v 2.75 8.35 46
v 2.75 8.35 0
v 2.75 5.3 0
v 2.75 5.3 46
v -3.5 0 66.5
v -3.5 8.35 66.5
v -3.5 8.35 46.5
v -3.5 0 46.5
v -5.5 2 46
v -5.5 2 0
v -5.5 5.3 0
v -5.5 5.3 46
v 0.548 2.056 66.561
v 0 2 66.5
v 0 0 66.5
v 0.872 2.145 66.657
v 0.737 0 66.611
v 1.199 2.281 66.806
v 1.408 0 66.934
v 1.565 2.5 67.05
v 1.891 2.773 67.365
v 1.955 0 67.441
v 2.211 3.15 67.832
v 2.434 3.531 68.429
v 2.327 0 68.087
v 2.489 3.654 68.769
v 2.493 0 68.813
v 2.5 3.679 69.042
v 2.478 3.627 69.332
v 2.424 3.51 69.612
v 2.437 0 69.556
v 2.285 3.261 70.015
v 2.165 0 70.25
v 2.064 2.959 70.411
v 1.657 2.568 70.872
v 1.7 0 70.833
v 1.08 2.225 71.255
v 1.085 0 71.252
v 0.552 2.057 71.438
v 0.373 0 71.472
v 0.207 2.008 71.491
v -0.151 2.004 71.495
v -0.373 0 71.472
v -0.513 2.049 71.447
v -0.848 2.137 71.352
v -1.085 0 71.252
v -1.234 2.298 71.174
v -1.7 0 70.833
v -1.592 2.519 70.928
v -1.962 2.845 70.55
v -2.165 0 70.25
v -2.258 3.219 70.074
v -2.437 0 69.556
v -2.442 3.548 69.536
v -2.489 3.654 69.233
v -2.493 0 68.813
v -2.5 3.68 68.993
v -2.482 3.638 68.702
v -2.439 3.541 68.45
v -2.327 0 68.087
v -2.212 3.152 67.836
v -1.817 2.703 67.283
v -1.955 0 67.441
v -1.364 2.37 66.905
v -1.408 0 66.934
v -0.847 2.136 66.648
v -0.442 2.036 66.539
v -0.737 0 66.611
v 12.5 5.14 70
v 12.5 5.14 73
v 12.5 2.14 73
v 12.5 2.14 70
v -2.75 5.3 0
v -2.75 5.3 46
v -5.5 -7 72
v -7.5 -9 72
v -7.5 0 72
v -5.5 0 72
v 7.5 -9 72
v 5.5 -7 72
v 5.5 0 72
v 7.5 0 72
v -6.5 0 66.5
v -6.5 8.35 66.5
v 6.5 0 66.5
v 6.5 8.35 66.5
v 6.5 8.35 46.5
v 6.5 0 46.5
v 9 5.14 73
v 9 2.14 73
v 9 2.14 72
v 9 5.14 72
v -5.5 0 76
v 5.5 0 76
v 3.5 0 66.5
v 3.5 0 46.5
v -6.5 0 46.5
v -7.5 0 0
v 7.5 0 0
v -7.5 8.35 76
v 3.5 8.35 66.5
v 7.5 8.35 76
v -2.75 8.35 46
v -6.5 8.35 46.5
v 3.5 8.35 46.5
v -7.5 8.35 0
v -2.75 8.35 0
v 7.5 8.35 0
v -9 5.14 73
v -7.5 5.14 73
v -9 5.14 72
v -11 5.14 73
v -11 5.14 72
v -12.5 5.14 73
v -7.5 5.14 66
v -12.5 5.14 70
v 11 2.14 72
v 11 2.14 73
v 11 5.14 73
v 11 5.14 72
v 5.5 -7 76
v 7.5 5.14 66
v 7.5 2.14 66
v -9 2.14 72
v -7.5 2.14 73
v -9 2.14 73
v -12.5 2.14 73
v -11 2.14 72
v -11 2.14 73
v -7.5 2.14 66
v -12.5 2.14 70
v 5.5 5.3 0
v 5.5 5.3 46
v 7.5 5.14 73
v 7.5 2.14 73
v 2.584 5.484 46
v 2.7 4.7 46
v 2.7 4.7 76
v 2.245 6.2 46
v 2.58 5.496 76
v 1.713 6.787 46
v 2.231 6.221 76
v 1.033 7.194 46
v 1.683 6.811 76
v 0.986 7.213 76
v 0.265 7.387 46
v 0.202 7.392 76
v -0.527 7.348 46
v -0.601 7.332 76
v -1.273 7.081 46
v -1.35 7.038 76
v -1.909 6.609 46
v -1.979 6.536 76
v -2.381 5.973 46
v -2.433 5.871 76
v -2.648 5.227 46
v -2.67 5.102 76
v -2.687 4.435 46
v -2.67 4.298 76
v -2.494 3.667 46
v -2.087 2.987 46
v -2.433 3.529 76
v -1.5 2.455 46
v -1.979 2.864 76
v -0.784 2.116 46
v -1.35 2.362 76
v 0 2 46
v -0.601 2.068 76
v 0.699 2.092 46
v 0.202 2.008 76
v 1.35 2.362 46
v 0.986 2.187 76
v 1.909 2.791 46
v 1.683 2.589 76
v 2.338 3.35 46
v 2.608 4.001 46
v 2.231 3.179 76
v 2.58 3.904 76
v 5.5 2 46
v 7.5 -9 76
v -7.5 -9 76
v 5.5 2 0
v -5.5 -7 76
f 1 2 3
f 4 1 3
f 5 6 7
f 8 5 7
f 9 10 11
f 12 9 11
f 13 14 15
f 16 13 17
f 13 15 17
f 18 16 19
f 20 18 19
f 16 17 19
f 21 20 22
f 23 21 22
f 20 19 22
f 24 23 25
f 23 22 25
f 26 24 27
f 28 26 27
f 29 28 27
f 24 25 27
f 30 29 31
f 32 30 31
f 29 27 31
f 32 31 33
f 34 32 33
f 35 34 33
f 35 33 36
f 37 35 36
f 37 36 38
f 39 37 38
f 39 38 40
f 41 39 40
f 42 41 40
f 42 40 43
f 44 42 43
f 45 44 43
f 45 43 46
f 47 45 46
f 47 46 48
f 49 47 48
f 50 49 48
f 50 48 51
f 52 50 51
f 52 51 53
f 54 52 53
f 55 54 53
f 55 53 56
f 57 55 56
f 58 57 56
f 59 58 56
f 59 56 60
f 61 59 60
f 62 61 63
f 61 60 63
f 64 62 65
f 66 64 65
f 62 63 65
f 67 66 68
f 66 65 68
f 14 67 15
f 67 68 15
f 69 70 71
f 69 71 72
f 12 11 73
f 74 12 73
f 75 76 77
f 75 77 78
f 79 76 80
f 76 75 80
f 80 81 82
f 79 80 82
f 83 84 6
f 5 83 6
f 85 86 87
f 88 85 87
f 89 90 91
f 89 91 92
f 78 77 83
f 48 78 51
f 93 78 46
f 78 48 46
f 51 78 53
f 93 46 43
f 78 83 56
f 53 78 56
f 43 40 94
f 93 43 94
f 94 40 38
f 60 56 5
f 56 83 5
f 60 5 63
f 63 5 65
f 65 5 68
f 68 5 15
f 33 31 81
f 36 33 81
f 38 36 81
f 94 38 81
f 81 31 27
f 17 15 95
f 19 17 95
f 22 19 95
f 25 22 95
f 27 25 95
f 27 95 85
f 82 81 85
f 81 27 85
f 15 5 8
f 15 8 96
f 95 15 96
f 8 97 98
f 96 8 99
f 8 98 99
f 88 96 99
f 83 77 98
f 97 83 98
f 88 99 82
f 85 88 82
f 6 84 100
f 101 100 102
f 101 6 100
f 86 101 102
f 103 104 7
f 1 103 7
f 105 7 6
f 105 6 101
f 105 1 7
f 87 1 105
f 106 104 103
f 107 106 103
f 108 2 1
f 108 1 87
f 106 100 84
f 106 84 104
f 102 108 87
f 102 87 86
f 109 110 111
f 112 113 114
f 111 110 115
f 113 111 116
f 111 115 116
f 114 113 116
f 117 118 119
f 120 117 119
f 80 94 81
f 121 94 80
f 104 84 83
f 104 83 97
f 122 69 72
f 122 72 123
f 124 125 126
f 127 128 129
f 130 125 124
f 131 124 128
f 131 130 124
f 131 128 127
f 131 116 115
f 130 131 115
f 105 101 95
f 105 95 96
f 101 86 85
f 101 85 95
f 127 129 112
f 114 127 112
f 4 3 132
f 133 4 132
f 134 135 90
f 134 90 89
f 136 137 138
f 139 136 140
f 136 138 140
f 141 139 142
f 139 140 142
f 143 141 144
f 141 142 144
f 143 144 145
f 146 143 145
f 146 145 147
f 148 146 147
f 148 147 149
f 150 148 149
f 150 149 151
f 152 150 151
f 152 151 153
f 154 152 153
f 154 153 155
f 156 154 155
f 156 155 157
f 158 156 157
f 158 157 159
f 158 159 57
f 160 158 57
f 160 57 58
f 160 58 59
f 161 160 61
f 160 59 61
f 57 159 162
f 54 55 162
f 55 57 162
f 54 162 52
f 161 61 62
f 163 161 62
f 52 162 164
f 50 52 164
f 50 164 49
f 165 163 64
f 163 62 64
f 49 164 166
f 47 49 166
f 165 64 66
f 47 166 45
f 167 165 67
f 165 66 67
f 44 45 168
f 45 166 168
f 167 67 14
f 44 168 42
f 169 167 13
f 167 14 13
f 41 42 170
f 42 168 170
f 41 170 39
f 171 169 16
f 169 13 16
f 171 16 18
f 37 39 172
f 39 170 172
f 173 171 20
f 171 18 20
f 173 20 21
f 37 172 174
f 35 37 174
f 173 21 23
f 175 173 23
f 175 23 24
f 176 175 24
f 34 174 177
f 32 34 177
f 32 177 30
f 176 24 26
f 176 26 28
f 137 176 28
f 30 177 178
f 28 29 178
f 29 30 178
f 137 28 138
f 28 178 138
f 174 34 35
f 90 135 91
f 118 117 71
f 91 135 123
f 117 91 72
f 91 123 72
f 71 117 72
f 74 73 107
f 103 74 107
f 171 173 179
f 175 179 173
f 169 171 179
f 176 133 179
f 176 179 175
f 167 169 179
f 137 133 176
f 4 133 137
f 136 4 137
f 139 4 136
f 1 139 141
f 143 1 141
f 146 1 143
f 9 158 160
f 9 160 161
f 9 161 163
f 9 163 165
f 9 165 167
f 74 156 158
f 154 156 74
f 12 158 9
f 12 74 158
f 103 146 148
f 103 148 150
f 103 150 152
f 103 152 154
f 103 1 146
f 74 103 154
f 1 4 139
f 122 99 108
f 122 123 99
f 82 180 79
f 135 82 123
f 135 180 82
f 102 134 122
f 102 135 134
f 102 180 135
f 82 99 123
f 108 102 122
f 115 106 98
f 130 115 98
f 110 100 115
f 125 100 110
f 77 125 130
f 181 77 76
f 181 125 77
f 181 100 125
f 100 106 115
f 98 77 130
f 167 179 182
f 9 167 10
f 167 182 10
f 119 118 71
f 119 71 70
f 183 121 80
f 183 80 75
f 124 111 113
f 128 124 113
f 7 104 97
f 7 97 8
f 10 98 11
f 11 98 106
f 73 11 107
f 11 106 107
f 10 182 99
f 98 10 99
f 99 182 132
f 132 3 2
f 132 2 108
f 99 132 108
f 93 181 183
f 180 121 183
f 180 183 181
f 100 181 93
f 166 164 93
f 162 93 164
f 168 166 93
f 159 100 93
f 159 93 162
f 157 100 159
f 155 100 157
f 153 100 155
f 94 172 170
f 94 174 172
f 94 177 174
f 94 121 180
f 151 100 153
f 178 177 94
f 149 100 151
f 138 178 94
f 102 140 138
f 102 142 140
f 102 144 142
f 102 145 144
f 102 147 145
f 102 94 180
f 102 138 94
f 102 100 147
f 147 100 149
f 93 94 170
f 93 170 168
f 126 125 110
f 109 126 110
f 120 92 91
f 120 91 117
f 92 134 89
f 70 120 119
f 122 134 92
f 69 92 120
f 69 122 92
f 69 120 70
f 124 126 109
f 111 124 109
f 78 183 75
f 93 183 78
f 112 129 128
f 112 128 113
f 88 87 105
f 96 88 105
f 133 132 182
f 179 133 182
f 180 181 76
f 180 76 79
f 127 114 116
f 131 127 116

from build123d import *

# Parameters (mm, degrees)
SKETCH9_W               = 15
SKETCH9_H               = 8.35
BOSS_EXTRUDE4_DEPTH     = 76
CUT_EXTRUDE4_DEPTH      = 46
SKETCH10_R              = 2.7
CUT_EXTRUDE5_DEPTH      = 30
SKETCH12_W              = 3
SKETCH12_H              = 3
BOSS_EXTRUDE5_DEPTH     = 5
SKETCH13_W              = 2
SKETCH13_H              = 3
CUT_EXTRUDE6_DEPTH      = 1
BOSS_EXTRUDE6_DEPTH     = 3
CUT_EXTRUDE7_REACH      = 79.472
SKETCH15_W              = 3
SKETCH15_H              = 20
CUT_EXTRUDE8_REACH      = 79.472
CUT_EXTRUDE8_END_RADIUS = 2.7
SKETCH16_R              = 2.5
BOSS_EXTRUDE8_DEPTH     = 4


with BuildPart() as part:
    # Sketch9 → Boss-Extrude4 (new body)
    with BuildSketch(Plane.XY):
        with Locations((0, 4.175)):
            Rectangle(SKETCH9_W, SKETCH9_H)
    extrude(amount=BOSS_EXTRUDE4_DEPTH)

    # Sketch7 → Cut-Extrude4 (cut)
    with BuildSketch(Plane.XY):
        Polygon((-5.5, 2), (-5.5, 5.3), (-2.75, 5.3), (-2.75, 8.35), (2.75, 8.35), (2.75, 5.3), (5.5, 5.3), (5.5, 2), align=None)
    extrude(amount=CUT_EXTRUDE4_DEPTH, mode=Mode.SUBTRACT)

    # Sketch10 → Cut-Extrude5 (cut)
    with BuildSketch(Plane.XY.offset(76)):
        with Locations((0, 4.7)):
            Circle(SKETCH10_R)
    extrude(amount=-CUT_EXTRUDE5_DEPTH, mode=Mode.SUBTRACT)

    # Sketch12 → Boss-Extrude5 (add)
    with BuildSketch(Plane(origin=(7.5, 0, 0), x_dir=(0, 0, -1), z_dir=(1, 0, 0))):
        with Locations((-71.5, 3.64)):
            Rectangle(SKETCH12_W, SKETCH12_H)
    boss_extrude5 = extrude(amount=BOSS_EXTRUDE5_DEPTH)

    # Sketch13 → Cut-Extrude6 (cut)
    with BuildSketch(Plane.XY.offset(73)):
        with Locations((10, 3.64)):
            Rectangle(SKETCH13_W, SKETCH13_H)
    cut_extrude6 = extrude(amount=-CUT_EXTRUDE6_DEPTH, mode=Mode.SUBTRACT)

    # Mirror2: Boss-Extrude5 across plane
    add(boss_extrude5.mirror(Plane(origin=(0, 0, 0), x_dir=(0, 0, 1), z_dir=(1, 0, 0))))

    # Mirror4: Cut-Extrude6 across plane
    add(cut_extrude6.mirror(Plane(origin=(0, 0, 0), x_dir=(0, 0, 1), z_dir=(1, 0, 0))), mode=Mode.SUBTRACT)

    # Sketch14 → Boss-Extrude6 (add)
    with BuildSketch(Plane(origin=(0, 5.14, 0), x_dir=(1, 0, 0), z_dir=(0, 1, 0))):
        Polygon((12.5, -70), (7.5, -66), (7.5, -70), align=None)
    boss_extrude6 = extrude(amount=-BOSS_EXTRUDE6_DEPTH)

    # Mirror5: Boss-Extrude6 across plane
    add(boss_extrude6.mirror(Plane(origin=(0, 0, 0), x_dir=(0, 0, 1), z_dir=(1, 0, 0))))

    # Sketch15 → Cut-Extrude7 (cut, up to next)
    with BuildSketch(Plane(origin=(0, 8.35, 0), x_dir=(1, 0, 0), z_dir=(0, 1, 0)), mode=Mode.PRIVATE) as cut_extrude7_sk1:
        with Locations((-5, -56.5)):
            Rectangle(SKETCH15_W, SKETCH15_H)
    cut_extrude7_tool1 = extrude(cut_extrude7_sk1.sketch, amount=-CUT_EXTRUDE7_REACH, mode=Mode.PRIVATE) & part.part
    cut_extrude7 = cut_extrude7_tool1.solids().sort_by_distance((-5, 8.35, 56.5))[0]
    add(cut_extrude7, mode=Mode.SUBTRACT)

    # Mirror6: Cut-Extrude7 across plane
    add(cut_extrude7.mirror(Plane(origin=(0, 0, 0), x_dir=(0, 0, 1), z_dir=(1, 0, 0))), mode=Mode.SUBTRACT)

    # Cut-Extrude8: up to this cylinder (the profile starts outside it)
    cut_extrude8_end = Plane(origin=(0, 4.7, 69), z_dir=(0, 0, 1)) * Cylinder(CUT_EXTRUDE8_END_RADIUS, 165.344, mode=Mode.PRIVATE)
    # Sketch16 → Cut-Extrude8 (cut, up to the surface)
    with BuildSketch(Plane.XZ, mode=Mode.PRIVATE) as cut_extrude8_sk1:
        with Locations(Location((0, 69, 0), (0, 0, 270))):
            Circle(SKETCH16_R)
    cut_extrude8_tool1 = extrude(cut_extrude8_sk1.sketch, amount=-CUT_EXTRUDE8_REACH, mode=Mode.PRIVATE) - cut_extrude8_end
    add(cut_extrude8_tool1.solids().sort_by_distance((0, 0, 69))[0], mode=Mode.SUBTRACT)

    # Sketch18 → Boss-Extrude8 (add)
    with BuildSketch(Plane.XY.offset(76)):
        Polygon((-5.5, 0), (-7.5, 0), (-7.5, -9), (7.5, -9), (7.5, 0), (5.5, 0), (5.5, -7), (-5.5, -7), align=None)
    extrude(amount=-BOSS_EXTRUDE8_DEPTH)


solid = part.part
